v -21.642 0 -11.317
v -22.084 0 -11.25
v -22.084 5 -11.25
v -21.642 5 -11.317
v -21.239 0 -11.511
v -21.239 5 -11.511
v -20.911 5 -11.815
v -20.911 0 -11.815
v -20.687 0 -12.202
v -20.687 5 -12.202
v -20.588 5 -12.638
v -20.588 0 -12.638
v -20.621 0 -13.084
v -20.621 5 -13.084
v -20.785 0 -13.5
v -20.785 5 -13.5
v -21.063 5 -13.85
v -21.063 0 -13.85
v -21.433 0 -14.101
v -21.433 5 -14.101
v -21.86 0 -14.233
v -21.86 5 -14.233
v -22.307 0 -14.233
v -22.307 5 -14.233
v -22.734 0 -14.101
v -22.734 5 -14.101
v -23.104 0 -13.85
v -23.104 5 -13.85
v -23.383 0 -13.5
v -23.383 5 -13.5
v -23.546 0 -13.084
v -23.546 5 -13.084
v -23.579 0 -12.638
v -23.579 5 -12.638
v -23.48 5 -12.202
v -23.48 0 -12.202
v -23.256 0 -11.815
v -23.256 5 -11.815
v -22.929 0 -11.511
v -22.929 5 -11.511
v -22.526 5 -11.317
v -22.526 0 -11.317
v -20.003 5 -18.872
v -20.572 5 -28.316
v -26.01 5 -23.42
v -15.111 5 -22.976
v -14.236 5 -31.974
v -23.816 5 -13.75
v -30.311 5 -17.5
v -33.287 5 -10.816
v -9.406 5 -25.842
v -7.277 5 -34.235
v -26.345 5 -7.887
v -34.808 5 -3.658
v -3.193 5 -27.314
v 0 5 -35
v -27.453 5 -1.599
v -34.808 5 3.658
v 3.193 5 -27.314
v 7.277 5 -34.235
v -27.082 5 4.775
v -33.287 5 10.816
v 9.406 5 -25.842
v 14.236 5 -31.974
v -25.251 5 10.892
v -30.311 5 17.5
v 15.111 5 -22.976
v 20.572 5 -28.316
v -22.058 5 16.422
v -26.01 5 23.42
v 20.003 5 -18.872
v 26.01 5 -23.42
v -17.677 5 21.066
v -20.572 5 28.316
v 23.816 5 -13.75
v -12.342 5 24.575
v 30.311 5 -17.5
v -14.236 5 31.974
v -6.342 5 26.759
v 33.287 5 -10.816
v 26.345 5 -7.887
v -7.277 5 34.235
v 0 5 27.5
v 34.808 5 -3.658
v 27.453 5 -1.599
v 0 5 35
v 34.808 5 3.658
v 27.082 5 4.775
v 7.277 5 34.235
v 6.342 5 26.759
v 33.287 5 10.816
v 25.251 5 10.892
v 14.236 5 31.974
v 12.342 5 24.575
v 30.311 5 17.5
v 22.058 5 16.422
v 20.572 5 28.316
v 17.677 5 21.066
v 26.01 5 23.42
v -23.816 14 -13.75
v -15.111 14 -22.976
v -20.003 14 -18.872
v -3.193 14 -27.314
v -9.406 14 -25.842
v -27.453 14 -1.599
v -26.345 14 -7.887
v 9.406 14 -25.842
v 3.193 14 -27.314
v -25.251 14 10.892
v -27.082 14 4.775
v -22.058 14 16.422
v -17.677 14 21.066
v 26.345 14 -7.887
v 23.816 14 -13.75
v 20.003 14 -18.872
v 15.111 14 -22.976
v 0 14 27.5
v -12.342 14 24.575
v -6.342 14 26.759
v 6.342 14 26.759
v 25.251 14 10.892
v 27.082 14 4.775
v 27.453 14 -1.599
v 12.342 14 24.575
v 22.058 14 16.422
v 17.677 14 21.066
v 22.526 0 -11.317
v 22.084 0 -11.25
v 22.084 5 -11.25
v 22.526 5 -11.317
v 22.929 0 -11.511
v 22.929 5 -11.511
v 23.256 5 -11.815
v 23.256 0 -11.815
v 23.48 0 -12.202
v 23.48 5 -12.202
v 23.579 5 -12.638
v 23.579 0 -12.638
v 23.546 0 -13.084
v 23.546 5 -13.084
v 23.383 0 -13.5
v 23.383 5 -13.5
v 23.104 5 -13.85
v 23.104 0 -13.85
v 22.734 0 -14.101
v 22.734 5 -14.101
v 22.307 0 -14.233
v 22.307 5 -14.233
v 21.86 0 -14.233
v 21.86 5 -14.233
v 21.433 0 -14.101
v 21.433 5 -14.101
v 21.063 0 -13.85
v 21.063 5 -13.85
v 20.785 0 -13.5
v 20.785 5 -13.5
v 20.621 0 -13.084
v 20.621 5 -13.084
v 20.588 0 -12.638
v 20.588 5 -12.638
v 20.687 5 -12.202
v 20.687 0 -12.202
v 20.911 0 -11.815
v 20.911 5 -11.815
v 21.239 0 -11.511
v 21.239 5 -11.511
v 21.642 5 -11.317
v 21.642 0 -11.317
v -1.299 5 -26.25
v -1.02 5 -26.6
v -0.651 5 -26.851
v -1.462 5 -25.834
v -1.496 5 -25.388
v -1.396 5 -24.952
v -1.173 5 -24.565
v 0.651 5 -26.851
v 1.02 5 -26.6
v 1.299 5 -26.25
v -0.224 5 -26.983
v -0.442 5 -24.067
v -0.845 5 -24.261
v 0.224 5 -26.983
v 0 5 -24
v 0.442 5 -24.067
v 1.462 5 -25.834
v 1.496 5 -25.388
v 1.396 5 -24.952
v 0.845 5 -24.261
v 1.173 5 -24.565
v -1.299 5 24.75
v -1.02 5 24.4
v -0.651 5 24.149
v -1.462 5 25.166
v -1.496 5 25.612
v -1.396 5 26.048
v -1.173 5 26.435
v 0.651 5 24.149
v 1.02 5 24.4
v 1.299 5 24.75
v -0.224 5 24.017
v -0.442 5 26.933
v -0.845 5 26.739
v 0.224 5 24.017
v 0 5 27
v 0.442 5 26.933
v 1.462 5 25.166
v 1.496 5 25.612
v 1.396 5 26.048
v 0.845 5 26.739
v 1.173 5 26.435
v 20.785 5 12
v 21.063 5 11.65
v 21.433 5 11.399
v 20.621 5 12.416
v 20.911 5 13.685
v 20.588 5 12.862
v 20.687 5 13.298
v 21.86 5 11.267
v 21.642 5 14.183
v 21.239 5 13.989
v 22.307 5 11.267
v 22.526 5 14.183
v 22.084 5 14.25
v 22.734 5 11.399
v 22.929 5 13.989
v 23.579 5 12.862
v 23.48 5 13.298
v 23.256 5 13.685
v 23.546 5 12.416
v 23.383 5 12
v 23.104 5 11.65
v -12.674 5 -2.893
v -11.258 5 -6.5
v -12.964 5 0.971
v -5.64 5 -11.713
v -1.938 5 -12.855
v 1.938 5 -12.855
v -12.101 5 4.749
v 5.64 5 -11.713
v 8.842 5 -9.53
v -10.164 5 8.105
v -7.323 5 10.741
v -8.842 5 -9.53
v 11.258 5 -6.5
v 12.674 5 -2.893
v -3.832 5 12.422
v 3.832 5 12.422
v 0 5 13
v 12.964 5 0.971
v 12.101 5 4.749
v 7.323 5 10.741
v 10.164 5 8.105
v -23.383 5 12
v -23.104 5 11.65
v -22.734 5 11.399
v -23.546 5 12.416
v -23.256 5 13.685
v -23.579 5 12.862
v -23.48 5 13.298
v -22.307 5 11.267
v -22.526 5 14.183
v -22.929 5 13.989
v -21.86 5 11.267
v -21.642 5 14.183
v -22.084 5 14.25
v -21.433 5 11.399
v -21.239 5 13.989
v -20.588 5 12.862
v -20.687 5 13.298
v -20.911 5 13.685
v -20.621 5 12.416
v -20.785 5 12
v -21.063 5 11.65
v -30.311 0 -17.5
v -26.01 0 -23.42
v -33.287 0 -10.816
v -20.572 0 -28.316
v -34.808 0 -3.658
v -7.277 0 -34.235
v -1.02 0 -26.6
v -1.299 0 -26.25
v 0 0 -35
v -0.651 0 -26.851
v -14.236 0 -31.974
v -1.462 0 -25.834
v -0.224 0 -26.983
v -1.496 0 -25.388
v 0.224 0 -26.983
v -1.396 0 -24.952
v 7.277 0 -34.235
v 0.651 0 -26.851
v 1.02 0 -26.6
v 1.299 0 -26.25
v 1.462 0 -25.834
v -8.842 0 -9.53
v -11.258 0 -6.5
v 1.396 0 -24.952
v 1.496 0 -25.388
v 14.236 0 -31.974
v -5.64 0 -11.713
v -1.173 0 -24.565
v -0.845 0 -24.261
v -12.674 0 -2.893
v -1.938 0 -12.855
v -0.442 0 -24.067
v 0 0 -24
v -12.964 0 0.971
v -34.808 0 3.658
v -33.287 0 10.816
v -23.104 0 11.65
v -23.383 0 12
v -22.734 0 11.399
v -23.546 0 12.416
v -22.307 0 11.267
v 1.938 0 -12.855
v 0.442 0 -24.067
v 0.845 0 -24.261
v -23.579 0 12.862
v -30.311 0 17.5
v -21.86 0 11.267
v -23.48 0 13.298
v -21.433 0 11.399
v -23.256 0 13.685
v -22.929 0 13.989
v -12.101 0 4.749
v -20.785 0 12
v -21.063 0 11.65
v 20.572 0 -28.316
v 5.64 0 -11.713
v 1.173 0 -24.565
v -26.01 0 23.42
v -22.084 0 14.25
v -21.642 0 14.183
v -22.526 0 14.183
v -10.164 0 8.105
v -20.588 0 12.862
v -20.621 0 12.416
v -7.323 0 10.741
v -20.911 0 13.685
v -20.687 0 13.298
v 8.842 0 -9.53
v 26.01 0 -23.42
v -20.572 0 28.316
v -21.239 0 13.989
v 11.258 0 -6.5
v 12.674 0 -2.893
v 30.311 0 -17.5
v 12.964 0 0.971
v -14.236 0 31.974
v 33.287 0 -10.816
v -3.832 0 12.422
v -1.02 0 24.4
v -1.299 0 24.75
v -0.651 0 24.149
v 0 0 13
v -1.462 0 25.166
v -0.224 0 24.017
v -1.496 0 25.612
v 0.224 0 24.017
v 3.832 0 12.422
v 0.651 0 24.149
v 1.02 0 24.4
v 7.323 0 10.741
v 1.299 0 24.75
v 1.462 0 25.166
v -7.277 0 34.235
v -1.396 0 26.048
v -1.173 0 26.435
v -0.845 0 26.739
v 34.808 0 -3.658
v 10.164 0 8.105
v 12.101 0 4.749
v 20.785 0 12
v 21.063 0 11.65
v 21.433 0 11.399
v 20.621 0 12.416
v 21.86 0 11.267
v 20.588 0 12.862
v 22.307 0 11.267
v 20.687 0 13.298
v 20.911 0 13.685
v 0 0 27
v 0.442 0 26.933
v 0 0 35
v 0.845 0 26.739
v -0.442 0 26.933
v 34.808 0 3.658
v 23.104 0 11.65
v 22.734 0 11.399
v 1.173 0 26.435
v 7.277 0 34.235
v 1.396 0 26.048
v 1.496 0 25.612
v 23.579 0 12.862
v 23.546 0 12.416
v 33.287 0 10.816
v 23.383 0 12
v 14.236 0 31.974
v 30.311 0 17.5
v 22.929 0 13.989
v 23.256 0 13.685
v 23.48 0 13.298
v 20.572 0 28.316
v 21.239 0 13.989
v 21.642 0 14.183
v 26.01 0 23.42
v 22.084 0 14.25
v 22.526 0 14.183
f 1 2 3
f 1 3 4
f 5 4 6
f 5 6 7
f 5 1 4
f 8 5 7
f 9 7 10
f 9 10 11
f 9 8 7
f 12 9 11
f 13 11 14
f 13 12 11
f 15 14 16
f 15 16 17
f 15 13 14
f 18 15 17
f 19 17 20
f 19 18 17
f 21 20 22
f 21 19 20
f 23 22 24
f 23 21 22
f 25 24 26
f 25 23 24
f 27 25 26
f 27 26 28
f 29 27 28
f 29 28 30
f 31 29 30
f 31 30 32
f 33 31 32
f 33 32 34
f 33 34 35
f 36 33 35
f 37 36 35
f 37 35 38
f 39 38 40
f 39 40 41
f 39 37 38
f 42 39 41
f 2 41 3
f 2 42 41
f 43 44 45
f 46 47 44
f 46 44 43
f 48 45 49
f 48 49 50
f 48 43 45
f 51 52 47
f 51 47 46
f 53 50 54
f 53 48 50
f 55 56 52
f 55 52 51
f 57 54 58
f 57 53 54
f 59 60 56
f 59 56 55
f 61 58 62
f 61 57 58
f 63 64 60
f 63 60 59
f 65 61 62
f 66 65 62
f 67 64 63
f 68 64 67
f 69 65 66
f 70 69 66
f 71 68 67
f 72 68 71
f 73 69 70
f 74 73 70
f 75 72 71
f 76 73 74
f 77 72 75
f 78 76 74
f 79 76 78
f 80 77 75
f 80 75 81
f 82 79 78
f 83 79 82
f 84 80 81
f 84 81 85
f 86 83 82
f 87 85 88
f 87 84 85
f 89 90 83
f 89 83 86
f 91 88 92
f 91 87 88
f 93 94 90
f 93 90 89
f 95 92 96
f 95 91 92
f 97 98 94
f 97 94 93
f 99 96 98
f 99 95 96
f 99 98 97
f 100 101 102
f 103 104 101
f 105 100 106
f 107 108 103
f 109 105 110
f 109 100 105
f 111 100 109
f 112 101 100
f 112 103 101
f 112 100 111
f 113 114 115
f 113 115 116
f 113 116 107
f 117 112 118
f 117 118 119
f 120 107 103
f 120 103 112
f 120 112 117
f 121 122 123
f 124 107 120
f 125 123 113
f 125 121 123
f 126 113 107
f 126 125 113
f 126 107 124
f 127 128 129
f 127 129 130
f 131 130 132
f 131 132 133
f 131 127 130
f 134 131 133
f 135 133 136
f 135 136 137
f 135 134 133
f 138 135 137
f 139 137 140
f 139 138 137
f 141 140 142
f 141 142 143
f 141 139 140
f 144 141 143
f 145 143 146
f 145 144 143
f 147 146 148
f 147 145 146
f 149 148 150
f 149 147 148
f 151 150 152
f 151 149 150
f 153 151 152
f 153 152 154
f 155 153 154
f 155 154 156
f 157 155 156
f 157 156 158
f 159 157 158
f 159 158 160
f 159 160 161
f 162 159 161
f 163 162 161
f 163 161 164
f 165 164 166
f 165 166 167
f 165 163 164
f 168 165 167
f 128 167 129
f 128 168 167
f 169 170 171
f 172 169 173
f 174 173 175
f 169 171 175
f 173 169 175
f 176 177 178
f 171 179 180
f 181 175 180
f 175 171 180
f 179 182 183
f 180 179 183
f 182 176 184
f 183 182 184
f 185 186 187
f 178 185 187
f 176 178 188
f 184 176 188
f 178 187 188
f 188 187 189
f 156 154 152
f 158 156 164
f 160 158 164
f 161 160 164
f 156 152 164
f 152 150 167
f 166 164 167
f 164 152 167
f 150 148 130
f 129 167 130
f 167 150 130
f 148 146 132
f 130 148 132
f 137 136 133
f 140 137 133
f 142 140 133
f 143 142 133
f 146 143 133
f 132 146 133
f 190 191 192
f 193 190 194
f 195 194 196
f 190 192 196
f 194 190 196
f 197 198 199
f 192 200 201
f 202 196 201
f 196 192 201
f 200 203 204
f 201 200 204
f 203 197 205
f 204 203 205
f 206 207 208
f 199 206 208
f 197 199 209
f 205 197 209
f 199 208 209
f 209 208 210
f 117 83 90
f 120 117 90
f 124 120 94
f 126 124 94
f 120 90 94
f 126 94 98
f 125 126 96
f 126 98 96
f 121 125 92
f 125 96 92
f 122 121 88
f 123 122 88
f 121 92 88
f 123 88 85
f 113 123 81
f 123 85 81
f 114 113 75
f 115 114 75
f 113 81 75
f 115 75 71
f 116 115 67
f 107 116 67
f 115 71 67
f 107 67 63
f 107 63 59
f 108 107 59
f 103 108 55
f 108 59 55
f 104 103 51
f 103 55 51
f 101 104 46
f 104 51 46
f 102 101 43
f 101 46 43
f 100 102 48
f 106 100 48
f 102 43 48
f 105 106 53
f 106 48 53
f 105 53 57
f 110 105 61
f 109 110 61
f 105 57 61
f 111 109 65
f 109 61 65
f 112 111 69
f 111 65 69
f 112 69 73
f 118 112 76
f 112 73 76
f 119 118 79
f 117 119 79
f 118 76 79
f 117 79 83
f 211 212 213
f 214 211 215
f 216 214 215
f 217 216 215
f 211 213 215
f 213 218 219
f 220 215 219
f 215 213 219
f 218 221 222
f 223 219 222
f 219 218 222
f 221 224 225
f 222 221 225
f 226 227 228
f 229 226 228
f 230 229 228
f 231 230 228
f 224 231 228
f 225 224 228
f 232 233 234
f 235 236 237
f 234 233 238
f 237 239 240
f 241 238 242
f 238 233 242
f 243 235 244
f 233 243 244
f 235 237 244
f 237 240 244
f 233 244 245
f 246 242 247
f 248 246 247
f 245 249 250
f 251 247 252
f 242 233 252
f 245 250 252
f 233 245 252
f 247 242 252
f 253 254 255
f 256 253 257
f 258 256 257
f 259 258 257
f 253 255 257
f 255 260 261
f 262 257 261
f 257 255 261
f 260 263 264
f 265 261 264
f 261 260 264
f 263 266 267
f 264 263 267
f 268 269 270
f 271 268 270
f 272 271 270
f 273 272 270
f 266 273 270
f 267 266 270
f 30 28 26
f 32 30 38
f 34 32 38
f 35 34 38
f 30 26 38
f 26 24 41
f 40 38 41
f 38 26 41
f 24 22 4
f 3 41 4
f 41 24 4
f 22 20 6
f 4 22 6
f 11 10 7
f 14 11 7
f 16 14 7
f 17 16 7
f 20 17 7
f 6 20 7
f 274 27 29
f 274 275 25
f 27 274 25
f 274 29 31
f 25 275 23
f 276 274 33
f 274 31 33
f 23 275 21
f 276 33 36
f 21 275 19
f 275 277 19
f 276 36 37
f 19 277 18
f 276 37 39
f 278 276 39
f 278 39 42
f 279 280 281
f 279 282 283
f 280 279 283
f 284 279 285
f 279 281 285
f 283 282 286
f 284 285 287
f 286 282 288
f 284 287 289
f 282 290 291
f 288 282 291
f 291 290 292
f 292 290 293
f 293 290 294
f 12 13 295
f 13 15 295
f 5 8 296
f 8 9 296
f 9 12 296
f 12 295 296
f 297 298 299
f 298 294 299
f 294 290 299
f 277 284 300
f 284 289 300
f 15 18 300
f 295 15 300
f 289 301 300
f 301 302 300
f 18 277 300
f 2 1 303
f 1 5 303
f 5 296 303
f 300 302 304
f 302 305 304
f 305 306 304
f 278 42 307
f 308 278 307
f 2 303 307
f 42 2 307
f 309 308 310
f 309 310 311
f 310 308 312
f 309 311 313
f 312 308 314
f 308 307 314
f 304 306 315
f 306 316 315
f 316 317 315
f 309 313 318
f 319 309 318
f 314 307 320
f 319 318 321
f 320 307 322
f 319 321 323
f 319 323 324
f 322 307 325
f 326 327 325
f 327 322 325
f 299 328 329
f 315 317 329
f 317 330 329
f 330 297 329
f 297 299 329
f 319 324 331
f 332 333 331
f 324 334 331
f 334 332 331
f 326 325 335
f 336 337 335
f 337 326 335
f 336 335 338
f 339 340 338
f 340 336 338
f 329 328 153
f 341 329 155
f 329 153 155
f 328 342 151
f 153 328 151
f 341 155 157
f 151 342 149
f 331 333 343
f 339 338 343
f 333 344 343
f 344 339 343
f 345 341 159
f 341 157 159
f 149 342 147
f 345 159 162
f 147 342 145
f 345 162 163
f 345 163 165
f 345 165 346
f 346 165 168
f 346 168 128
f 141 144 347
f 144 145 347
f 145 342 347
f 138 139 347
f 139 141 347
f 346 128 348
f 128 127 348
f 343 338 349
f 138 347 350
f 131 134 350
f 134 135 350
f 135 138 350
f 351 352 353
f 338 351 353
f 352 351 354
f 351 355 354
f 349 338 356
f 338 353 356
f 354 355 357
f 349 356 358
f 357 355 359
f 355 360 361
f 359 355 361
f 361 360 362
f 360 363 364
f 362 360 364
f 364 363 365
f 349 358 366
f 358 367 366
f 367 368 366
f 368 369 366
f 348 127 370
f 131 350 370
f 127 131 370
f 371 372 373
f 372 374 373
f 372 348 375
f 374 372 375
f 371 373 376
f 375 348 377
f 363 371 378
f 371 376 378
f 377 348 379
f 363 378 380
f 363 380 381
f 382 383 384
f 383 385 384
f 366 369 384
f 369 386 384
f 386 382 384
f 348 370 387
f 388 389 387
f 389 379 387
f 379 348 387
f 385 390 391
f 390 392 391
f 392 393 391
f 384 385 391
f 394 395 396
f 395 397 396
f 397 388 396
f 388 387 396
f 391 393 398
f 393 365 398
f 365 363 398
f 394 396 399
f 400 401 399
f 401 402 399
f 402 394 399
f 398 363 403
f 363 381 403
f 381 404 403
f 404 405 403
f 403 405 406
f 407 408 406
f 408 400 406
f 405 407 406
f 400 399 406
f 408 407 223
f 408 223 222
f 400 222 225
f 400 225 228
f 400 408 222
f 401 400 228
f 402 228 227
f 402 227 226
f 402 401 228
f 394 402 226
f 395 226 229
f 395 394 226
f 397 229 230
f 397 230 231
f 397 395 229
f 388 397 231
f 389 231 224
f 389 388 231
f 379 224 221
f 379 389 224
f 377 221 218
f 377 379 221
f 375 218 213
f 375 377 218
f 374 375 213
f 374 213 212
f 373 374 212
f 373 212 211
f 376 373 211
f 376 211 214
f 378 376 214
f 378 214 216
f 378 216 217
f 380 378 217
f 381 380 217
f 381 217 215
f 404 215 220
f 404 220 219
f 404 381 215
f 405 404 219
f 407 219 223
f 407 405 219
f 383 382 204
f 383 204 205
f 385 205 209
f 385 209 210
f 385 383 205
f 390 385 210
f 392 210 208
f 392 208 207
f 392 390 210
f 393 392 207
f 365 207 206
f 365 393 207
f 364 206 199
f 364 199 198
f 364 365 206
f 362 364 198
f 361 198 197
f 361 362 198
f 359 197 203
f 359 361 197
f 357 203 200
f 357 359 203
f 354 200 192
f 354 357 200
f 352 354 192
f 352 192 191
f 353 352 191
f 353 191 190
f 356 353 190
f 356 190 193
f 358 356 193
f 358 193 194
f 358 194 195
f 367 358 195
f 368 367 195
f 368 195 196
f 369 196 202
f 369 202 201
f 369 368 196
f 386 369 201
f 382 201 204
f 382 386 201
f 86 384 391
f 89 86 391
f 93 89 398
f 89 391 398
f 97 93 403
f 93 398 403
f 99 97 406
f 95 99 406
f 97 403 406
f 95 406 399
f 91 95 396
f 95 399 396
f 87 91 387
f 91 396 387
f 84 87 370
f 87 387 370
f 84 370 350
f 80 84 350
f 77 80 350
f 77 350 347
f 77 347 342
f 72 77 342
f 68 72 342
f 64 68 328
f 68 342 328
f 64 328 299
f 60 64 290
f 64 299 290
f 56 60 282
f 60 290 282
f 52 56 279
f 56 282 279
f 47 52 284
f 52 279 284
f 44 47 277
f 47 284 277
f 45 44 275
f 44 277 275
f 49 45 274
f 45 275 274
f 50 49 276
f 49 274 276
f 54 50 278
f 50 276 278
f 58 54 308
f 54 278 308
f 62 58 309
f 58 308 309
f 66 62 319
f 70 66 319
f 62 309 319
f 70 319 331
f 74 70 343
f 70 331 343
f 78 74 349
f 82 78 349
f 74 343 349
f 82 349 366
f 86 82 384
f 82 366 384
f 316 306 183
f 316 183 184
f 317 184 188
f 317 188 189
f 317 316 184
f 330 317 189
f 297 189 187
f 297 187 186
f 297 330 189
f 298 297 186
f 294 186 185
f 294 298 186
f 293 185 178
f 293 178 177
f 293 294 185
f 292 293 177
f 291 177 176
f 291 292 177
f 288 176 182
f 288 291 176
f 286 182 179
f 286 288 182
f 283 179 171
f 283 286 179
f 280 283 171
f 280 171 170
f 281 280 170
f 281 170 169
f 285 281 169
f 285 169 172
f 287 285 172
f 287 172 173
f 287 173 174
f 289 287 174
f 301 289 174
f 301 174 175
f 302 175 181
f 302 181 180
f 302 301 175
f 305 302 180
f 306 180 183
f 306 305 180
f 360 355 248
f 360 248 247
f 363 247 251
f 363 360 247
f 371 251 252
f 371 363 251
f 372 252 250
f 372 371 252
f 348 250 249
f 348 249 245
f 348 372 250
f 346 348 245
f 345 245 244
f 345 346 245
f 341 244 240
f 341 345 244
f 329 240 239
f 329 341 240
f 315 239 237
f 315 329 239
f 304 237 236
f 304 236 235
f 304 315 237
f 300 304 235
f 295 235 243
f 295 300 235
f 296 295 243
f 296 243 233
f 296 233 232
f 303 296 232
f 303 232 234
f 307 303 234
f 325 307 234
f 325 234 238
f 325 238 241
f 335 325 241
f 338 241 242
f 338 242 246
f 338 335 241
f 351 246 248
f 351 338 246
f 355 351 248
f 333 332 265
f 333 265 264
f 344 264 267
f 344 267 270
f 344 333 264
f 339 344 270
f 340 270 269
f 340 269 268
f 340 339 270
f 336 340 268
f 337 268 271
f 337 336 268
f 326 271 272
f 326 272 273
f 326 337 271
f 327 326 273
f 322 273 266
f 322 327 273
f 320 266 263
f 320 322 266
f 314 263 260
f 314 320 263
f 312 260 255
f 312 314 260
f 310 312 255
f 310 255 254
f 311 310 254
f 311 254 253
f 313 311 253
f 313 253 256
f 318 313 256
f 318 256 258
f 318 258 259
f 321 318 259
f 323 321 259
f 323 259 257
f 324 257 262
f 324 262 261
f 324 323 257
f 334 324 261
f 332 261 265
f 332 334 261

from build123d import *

# Parameters (mm, degrees)
SKETCH1_R           = 35
SKETCH1_R_2         = 1.5
SKETCH1_R_3         = 13
BOSS_EXTRUDE1_DEPTH = 5
SKETCH2_R           = 27.5
BOSS_EXTRUDE2_DEPTH = 9


with BuildPart() as part:
    # Sketch1 → Boss-Extrude1 (new body)
    with BuildSketch(Plane(origin=(0, 0, 0), x_dir=(1, 0, 0), z_dir=(0, 1, 0))):
        with Locations(Location((0, 0, 0), (0, 0, 270))):
            Circle(SKETCH1_R)
        with Locations(Location((0, 25.5, 0), (0, 0, 270))):
            Circle(SKETCH1_R_2, mode=Mode.SUBTRACT)
        with Locations(Location((22.083647797, 12.75, 0), (0, 0, 270))):
            Circle(SKETCH1_R_2, mode=Mode.SUBTRACT)
        with Locations(Location((22.083647797, -12.75, 0), (0, 0, 270))):
            Circle(SKETCH1_R_2, mode=Mode.SUBTRACT)
        with Locations(Location((0, -25.5, 0), (0, 0, 270))):
            Circle(SKETCH1_R_2, mode=Mode.SUBTRACT)
        with Locations(Location((-22.083647797, -12.75, 0), (0, 0, 270))):
            Circle(SKETCH1_R_2, mode=Mode.SUBTRACT)
        with Locations(Location((-22.083647797, 12.75, 0), (0, 0, 270))):
            Circle(SKETCH1_R_2, mode=Mode.SUBTRACT)
        with Locations(Location((0, 0, 0), (0, 0, 270))):
            Circle(SKETCH1_R_3, mode=Mode.SUBTRACT)
    extrude(amount=BOSS_EXTRUDE1_DEPTH)

    # Sketch2 → Boss-Extrude2 (add)
    with BuildSketch(Plane(origin=(0, 5, 0), x_dir=(1, 0, 0), z_dir=(0, 1, 0))):
        with Locations(Location((0, 0, 0), (0, 0, 270))):
            Circle(SKETCH2_R)
    extrude(amount=BOSS_EXTRUDE2_DEPTH)


solid = part.part
